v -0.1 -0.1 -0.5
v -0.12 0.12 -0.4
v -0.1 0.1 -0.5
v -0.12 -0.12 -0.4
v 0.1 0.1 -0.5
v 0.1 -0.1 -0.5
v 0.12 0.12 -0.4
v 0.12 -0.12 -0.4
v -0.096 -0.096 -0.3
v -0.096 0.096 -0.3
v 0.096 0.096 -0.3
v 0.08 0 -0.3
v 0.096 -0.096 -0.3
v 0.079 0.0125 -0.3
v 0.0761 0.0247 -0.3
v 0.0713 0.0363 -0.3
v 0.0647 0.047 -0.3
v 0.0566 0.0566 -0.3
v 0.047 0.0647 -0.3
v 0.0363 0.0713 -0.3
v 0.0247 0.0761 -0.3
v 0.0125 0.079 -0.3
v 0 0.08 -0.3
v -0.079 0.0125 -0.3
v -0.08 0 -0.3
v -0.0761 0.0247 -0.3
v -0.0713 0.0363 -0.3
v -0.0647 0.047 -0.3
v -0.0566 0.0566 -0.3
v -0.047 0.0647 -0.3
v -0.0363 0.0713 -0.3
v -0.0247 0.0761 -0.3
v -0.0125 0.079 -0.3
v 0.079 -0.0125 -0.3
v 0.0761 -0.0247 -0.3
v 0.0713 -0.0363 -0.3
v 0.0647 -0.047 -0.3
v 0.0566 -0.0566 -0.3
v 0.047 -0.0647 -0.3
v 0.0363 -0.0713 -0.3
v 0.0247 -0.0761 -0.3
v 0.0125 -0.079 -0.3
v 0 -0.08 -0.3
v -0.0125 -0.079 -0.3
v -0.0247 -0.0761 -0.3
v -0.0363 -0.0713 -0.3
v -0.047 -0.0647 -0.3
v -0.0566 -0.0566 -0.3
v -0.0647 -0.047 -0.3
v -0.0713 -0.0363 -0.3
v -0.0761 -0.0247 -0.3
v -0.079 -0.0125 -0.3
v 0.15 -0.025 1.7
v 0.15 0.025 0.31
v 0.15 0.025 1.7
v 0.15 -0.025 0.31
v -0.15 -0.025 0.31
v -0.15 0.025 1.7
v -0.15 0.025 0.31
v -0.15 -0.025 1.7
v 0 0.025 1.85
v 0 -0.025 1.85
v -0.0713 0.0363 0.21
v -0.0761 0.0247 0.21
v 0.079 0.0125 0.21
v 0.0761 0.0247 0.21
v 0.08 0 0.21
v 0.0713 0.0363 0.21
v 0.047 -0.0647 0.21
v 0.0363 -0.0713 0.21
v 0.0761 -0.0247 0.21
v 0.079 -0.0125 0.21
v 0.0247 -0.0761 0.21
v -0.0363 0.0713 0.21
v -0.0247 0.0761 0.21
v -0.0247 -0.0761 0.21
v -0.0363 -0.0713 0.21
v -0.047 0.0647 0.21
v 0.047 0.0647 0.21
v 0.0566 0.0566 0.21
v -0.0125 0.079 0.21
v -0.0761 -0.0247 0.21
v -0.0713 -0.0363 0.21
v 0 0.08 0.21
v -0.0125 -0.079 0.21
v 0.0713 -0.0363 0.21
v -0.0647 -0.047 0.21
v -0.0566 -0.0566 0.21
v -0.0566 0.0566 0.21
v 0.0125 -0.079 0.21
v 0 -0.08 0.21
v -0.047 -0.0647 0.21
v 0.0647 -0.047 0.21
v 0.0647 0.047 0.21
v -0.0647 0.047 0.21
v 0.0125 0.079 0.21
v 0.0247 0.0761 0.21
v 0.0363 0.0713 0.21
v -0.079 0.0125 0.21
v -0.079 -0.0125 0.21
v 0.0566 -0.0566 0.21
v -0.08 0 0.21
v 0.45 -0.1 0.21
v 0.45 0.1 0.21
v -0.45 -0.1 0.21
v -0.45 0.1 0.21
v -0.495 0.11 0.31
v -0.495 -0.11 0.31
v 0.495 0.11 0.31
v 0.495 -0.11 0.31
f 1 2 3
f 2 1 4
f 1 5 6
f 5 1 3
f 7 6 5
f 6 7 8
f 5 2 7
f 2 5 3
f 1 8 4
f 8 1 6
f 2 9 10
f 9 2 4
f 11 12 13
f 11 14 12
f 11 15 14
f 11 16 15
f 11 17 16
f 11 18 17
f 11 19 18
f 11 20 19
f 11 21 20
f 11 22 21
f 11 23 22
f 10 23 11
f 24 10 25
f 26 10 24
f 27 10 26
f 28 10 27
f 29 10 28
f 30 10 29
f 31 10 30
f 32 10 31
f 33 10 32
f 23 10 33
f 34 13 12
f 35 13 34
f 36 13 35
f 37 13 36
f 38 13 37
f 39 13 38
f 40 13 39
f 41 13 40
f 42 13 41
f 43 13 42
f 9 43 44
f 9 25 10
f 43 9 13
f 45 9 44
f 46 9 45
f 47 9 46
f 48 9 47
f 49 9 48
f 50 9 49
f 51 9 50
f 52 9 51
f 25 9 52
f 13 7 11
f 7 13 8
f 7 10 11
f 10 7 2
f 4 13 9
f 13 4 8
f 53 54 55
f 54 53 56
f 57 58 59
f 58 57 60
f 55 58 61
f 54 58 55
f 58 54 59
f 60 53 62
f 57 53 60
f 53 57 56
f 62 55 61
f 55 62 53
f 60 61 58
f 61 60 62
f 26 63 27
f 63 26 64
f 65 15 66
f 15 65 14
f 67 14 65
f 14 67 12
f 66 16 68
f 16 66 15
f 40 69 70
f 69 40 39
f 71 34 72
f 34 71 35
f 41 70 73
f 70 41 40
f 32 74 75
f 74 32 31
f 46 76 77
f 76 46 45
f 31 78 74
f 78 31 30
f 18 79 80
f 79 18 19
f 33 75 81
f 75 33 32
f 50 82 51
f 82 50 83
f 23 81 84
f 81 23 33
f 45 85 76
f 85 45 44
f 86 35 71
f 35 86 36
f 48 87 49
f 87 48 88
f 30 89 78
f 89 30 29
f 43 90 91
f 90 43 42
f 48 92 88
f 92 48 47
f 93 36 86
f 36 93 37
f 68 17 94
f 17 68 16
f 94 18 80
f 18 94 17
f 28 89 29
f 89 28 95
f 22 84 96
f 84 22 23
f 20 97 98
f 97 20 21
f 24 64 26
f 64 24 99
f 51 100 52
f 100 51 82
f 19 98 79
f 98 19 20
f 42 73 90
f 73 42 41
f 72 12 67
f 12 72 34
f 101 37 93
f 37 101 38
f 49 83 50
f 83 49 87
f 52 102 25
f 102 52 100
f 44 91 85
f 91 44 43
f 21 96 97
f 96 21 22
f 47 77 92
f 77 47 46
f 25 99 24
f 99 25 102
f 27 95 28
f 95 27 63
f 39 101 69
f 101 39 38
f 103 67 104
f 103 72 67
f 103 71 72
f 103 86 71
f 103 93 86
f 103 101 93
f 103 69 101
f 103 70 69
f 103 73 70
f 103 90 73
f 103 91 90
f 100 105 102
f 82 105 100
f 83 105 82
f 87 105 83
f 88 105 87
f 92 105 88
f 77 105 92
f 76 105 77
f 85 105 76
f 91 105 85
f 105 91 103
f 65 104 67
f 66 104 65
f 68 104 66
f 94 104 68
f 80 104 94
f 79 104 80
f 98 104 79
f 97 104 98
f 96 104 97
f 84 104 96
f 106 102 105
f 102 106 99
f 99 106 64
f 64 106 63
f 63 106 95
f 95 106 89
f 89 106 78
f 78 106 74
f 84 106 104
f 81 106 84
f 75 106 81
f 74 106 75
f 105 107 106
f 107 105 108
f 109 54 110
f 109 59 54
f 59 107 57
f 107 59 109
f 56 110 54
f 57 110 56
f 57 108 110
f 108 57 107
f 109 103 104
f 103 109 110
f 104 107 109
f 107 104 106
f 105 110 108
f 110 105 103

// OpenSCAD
module Sword_01(){

    color("#563232")
    cylinder(0.6,0.08,0.08, $fn = 40, center= true);

    color("#eec134"){
    
    translate([0,0,-0.5])
    linear_extrude(height= 0.1, scale = 1.2)
    square(0.2, center = true);

    translate([0,0,-0.4])
    linear_extrude(height= 0.1, scale = 0.8)
    square(0.2* 1.2, center = true);
    }

    color("#eec134")

    translate([0,0,0.21])
    linear_extrude(height= 0.1, scale = 1.1)
    square([0.9,0.20], center = true);

    color("gray"){
    translate([0,0,1])
    cube([0.3,0.05,1.4] ,center = true);

    translate([0,0,1.7])
    rotate([0,45,0])
    cube([0.3 / sqrt(2),0.05,0.3 / sqrt(2)] ,center = true);
    }

}

Sword_01();


// Written by Nicolì Angelo (Gengio) 2024: 
// MIT License

//Permission is hereby granted, free of charge, to any person obtaining a copy of this software and associated documentation files (the "Software"), to deal in the Software without restriction, including without limitation the rights to use, copy, modify, merge, publish, distribute, sublicense, and/or sell copies of the Software, and to permit persons to whom the Software is furnished to do so, subject to the following conditions:

//The above copyright notice and this permission notice shall be included in all copies or substantial portions of the Software.

//THE SOFTWARE IS PROVIDED "AS IS", WITHOUT WARRANTY OF ANY KIND, EXPRESS OR IMPLIED, INCLUDING BUT NOT LIMITED TO THE WARRANTIES OF MERCHANTABILITY, FITNESS FOR A PARTICULAR PURPOSE AND NONINFRINGEMENT. IN NO EVENT SHALL THE AUTHORS OR COPYRIGHT HOLDERS BE LIABLE FOR ANY CLAIM, DAMAGES OR OTHER LIABILITY, WHETHER IN AN ACTION OF CONTRACT, TORT OR OTHERWISE, ARISING FROM, OUT OF OR IN CONNECTION WITH THE SOFTWARE OR THE USE OR OTHER DEALINGS IN THE SOFTWARE.
